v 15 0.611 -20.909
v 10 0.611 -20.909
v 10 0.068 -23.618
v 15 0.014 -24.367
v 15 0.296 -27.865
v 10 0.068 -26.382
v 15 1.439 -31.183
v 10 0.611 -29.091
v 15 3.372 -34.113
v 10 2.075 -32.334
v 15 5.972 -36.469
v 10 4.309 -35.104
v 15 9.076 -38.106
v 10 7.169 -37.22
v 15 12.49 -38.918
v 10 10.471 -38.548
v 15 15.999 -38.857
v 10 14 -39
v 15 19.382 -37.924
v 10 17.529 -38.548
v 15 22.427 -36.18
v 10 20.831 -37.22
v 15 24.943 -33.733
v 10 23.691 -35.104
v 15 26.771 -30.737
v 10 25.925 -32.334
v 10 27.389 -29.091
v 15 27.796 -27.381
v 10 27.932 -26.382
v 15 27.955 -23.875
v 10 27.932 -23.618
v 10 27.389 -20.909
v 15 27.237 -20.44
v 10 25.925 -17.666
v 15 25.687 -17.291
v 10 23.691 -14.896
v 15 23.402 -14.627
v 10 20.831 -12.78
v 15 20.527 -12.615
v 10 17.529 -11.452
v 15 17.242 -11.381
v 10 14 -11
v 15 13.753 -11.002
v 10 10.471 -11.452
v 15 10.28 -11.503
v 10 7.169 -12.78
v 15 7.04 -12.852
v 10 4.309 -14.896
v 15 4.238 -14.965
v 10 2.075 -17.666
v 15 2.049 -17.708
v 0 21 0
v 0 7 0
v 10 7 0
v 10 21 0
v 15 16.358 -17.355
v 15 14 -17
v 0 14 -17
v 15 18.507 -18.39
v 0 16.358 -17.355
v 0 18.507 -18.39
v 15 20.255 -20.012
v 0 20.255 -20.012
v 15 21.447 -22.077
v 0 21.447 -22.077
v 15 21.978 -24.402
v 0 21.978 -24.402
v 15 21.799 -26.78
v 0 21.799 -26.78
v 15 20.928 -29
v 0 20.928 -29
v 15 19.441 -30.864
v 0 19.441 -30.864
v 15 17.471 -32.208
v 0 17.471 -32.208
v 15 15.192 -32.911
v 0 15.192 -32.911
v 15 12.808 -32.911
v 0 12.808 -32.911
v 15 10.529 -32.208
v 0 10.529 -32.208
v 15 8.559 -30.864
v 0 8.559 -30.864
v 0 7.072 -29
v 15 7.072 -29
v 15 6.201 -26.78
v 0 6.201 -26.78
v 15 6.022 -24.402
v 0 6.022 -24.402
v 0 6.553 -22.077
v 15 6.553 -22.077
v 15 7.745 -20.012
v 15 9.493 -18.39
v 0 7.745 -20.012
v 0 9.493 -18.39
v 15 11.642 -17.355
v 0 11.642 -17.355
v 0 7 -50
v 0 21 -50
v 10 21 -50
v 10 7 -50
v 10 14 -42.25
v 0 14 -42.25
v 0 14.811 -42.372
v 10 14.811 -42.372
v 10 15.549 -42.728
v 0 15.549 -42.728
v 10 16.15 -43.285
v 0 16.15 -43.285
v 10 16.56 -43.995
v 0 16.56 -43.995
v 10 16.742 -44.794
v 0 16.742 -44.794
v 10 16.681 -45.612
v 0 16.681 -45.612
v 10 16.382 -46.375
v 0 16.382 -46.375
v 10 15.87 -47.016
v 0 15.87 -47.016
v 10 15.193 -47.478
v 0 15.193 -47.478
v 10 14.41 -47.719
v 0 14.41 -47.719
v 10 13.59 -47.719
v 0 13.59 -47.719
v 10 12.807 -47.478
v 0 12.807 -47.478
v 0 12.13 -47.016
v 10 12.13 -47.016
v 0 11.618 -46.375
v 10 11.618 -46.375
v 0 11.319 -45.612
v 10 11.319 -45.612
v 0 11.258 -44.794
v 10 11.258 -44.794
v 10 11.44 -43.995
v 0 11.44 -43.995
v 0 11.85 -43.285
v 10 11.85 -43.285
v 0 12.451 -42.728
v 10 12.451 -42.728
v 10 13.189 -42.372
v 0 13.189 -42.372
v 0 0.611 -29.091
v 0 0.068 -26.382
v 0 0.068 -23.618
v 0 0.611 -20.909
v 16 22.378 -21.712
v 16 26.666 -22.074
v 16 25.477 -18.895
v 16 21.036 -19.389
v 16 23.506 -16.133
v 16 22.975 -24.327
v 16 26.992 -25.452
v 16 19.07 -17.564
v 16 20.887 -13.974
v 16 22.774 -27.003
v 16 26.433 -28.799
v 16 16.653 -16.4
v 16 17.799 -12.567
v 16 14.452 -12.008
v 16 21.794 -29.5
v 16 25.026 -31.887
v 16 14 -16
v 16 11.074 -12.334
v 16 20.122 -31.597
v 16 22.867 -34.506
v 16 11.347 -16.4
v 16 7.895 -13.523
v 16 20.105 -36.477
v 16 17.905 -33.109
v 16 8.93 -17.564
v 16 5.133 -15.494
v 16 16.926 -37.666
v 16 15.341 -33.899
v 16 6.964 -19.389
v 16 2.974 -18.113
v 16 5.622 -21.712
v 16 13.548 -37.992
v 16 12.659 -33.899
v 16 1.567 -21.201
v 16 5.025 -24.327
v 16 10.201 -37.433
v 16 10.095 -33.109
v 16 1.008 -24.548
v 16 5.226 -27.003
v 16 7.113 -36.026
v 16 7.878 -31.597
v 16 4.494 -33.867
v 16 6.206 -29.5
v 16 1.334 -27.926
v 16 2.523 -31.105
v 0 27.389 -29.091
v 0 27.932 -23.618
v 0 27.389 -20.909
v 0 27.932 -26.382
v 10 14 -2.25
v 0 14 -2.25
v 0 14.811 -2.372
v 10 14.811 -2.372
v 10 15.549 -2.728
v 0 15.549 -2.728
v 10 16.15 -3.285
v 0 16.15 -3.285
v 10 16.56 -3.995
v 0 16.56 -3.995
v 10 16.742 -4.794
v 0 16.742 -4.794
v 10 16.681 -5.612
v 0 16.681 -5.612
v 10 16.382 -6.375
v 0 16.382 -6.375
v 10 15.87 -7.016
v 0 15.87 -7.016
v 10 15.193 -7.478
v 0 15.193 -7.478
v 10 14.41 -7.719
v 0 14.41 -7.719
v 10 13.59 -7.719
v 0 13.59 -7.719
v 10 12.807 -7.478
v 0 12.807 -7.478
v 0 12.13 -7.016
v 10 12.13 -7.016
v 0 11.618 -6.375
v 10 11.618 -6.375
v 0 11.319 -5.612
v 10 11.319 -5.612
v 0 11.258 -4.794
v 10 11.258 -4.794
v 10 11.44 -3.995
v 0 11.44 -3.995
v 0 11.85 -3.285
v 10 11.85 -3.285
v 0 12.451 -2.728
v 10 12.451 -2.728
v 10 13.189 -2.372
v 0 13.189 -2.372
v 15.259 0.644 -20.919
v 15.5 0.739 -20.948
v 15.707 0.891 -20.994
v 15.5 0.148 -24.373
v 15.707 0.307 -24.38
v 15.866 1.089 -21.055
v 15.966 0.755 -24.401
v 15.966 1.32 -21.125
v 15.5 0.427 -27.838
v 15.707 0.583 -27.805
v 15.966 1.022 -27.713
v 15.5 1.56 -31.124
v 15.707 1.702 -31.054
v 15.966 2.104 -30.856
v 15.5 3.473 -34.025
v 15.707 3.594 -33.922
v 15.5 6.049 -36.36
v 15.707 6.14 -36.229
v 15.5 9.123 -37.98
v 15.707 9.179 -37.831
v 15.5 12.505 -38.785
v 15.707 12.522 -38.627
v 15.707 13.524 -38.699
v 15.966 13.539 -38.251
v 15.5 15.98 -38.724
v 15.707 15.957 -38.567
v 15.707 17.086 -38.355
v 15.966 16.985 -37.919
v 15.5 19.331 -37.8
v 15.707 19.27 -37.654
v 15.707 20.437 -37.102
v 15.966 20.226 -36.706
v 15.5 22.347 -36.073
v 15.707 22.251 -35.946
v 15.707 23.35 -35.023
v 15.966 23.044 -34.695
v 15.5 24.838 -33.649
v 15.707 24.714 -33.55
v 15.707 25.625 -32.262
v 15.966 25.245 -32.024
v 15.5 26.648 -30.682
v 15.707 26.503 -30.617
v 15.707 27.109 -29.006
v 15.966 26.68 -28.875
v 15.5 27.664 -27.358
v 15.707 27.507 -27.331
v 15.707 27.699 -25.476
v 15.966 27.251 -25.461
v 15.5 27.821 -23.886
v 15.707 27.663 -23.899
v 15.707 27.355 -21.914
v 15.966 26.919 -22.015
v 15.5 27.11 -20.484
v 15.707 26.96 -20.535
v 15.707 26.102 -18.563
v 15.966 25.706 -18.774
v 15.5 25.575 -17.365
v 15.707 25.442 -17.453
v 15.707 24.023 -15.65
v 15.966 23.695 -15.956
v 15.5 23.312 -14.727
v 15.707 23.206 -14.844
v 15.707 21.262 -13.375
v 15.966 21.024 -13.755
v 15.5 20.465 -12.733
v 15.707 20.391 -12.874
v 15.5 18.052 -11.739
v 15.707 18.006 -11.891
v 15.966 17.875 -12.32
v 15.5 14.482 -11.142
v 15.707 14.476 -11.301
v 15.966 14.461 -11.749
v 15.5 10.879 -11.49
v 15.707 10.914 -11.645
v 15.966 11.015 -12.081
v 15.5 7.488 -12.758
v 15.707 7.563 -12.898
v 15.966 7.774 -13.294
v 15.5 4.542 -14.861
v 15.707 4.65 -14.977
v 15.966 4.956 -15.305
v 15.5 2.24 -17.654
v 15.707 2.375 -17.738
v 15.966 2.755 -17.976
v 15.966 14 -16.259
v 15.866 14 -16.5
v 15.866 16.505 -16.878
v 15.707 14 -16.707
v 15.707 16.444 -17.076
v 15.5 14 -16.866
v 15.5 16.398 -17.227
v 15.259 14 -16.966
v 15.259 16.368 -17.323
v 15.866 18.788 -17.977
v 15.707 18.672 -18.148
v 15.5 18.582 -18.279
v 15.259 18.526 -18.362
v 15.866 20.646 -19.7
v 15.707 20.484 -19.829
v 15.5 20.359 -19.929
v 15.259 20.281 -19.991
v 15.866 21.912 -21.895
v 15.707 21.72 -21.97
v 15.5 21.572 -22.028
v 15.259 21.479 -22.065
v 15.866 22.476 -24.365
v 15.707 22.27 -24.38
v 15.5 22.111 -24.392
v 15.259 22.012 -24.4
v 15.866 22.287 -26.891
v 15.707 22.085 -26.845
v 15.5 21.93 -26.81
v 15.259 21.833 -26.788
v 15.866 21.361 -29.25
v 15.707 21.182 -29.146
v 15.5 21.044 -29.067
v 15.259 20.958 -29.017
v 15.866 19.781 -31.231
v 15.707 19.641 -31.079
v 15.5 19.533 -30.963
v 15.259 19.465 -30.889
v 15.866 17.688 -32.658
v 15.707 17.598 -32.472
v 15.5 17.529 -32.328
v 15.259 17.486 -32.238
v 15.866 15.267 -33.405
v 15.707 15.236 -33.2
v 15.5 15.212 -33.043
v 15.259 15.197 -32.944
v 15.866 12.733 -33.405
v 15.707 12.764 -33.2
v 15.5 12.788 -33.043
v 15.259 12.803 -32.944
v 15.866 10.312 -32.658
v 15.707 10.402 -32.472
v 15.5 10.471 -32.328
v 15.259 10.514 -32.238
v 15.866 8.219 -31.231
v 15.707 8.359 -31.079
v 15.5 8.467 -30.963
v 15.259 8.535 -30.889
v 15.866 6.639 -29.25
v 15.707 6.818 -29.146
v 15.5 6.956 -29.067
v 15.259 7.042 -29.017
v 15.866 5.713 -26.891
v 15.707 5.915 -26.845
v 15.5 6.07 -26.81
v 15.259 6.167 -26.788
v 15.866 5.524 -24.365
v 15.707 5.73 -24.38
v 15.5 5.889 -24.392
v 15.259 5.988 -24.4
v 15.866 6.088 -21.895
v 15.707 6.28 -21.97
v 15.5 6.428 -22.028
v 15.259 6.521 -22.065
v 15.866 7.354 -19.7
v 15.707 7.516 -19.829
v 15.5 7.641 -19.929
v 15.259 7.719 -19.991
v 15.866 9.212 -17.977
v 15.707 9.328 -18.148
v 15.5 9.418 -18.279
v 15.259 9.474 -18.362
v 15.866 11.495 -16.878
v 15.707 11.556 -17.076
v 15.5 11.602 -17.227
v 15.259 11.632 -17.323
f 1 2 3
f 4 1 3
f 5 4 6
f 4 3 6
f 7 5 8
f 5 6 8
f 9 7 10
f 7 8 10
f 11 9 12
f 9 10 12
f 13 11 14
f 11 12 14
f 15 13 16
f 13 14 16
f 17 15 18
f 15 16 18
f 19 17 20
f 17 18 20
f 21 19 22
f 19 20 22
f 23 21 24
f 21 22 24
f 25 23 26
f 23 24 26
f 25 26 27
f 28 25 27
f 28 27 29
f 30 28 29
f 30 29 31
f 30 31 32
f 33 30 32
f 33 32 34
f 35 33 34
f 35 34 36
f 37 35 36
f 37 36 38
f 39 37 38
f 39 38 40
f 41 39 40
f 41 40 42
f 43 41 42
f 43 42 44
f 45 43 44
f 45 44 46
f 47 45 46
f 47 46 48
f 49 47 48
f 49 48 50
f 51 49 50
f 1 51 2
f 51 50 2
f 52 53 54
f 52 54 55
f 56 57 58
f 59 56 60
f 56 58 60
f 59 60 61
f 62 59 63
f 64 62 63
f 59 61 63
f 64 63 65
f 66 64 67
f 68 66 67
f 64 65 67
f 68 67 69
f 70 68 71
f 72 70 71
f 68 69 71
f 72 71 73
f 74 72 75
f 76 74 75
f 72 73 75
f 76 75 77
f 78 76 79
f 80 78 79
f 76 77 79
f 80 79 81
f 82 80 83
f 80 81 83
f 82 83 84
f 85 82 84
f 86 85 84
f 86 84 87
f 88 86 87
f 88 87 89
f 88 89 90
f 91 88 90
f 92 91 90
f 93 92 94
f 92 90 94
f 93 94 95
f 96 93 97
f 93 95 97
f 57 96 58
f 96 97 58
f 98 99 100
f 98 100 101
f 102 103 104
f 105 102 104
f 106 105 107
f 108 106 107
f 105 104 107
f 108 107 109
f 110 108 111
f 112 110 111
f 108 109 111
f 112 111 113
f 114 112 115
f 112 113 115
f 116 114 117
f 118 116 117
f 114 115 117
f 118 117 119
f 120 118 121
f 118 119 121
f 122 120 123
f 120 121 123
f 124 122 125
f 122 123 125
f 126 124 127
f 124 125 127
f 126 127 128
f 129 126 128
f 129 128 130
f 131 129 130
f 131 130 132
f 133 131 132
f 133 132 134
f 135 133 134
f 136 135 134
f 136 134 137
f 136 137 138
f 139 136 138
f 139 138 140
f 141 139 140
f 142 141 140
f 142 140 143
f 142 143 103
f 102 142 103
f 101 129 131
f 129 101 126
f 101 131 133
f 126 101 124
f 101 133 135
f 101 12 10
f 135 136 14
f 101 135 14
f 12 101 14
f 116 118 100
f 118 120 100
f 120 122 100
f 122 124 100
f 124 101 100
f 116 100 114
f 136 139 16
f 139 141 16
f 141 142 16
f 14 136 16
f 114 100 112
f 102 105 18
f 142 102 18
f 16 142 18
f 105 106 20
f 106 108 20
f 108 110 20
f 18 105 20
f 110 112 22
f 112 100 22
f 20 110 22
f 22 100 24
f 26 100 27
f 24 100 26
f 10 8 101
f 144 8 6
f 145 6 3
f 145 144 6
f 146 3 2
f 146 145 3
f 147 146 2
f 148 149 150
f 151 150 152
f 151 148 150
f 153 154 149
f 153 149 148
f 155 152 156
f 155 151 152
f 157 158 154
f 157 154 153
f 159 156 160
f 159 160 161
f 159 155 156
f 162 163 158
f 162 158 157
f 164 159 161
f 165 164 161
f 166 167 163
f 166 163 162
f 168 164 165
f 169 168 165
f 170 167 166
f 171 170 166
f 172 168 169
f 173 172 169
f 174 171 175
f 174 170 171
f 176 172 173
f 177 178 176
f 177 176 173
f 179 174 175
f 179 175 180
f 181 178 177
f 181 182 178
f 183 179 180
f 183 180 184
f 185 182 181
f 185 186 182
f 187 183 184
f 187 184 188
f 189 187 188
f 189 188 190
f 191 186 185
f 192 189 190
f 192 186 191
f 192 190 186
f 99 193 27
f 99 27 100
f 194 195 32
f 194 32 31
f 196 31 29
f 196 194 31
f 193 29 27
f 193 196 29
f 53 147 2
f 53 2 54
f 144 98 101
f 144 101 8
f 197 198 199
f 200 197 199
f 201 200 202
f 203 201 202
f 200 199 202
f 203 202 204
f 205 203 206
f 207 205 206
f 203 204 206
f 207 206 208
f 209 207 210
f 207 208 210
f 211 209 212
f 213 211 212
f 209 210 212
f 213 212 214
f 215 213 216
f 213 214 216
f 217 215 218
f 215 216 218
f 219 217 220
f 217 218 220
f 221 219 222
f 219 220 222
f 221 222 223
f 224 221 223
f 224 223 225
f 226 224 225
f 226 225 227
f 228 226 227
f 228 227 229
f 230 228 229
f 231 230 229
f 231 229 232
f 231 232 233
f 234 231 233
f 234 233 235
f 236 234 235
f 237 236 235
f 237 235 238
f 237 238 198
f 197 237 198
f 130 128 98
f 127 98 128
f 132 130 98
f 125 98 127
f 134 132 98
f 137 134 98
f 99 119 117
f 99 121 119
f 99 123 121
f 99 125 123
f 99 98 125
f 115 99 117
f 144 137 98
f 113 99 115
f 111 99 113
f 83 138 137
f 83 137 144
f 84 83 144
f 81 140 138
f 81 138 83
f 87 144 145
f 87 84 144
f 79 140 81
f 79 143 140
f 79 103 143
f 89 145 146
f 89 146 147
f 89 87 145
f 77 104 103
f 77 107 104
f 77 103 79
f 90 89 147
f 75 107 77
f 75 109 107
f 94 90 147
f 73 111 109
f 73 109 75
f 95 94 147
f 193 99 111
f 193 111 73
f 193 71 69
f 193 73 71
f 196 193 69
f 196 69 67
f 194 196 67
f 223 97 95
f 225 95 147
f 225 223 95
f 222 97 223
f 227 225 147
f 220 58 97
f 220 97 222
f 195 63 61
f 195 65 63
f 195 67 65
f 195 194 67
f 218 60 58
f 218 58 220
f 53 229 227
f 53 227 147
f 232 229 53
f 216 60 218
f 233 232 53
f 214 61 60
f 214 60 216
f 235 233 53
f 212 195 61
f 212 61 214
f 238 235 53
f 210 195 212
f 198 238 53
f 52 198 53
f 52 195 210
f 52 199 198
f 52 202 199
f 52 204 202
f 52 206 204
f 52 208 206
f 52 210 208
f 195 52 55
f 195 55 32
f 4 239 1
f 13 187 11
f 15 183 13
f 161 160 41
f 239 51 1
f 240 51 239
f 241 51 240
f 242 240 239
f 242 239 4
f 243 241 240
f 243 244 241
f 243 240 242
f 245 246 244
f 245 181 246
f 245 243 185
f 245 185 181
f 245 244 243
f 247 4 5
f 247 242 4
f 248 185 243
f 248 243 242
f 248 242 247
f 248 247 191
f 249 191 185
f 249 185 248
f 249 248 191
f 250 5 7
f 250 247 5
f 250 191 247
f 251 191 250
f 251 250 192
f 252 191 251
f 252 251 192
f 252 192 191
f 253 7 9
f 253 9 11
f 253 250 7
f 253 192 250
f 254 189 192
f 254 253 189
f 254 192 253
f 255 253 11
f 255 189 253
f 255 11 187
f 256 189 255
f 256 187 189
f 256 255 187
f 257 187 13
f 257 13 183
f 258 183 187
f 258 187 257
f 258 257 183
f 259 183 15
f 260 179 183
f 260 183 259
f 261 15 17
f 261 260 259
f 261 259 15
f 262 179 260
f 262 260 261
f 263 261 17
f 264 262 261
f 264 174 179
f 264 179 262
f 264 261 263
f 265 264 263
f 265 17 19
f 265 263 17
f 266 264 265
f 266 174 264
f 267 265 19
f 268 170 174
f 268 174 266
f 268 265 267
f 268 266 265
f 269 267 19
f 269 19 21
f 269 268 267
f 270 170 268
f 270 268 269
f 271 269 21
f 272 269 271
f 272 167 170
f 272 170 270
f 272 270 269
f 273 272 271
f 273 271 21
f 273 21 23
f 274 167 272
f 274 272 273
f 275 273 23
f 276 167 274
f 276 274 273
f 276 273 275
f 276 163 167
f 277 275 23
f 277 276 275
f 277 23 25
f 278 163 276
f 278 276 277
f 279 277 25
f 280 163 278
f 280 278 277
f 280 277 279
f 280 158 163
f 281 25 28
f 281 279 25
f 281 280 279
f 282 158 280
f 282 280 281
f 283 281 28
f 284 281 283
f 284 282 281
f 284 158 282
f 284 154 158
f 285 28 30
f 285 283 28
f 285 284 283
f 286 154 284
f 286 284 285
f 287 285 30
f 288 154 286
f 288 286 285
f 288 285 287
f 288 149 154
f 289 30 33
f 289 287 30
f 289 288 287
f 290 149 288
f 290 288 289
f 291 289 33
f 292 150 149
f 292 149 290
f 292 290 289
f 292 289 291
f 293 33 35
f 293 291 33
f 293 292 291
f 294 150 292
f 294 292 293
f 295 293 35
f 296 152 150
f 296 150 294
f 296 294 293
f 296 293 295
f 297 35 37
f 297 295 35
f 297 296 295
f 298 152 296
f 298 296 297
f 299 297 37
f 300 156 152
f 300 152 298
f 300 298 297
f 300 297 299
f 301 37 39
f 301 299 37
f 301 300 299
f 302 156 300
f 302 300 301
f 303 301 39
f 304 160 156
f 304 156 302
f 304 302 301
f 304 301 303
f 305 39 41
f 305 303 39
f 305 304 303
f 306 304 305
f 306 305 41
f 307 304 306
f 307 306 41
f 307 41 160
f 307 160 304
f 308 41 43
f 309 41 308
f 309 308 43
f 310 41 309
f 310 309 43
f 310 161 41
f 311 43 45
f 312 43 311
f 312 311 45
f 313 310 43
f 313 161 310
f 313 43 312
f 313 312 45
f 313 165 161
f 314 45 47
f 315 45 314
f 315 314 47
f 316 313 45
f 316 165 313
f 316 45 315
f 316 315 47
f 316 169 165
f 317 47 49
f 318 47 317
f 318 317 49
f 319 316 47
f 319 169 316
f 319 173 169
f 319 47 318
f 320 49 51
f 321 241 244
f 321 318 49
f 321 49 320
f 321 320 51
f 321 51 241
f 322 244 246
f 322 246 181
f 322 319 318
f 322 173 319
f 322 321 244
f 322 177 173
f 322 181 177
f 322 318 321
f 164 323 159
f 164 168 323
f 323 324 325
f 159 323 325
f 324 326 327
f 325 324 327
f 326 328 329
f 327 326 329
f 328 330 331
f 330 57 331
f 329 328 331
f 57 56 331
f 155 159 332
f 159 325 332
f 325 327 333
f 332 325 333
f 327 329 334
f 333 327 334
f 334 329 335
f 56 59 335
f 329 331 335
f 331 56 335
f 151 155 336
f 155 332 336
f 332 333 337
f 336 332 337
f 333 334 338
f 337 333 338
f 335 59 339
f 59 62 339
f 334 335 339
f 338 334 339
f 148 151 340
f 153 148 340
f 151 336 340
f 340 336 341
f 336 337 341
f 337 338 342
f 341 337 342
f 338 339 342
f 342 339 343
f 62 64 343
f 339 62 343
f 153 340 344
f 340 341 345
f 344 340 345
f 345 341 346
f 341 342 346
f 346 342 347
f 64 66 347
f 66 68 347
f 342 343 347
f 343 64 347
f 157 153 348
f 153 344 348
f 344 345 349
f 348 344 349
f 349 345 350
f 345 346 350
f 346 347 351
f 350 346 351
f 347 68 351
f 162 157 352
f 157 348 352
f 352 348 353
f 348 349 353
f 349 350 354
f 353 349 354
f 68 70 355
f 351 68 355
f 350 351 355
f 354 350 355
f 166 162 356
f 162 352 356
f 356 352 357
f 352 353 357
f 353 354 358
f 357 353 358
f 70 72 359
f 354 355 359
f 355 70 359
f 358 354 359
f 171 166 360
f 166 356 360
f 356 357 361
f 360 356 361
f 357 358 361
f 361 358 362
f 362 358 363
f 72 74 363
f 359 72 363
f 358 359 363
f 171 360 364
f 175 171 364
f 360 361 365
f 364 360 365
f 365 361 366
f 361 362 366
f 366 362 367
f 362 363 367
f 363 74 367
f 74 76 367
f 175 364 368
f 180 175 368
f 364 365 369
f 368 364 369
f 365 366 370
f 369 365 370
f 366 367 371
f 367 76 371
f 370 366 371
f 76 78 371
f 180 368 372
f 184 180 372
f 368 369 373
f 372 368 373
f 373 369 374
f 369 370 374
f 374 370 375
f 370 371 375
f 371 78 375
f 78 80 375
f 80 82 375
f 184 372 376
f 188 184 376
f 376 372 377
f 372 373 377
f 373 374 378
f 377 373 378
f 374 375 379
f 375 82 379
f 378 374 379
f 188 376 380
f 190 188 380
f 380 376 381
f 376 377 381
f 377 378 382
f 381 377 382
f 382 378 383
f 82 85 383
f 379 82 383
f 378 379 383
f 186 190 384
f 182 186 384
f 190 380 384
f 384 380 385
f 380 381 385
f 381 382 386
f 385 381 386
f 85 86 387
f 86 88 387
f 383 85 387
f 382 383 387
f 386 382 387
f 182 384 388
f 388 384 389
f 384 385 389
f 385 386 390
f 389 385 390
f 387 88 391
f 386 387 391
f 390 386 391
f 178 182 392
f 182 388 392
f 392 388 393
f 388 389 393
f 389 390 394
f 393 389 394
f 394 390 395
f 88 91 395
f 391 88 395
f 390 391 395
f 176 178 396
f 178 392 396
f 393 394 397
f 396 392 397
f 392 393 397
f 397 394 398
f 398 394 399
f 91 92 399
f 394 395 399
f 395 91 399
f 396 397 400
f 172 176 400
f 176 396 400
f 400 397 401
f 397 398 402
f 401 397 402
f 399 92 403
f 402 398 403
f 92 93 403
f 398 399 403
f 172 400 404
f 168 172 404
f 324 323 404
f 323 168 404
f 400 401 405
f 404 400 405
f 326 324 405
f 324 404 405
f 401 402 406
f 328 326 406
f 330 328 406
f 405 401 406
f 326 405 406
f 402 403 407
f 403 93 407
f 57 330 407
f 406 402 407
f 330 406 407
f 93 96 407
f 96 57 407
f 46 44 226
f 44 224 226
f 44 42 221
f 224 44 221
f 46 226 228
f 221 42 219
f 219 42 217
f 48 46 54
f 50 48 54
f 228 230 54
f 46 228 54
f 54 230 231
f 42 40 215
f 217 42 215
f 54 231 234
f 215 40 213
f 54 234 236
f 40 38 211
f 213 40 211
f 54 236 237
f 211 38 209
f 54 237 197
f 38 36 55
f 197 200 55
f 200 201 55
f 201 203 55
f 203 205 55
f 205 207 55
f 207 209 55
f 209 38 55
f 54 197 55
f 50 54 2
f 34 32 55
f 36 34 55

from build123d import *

# Parameters (mm, degrees)
BOSS_EXTRUDE1_DEPTH = 10
SKETCH3_R           = 14
BOSS_EXTRUDE2_DEPTH = 6
SKETCH4_R           = 2.75
SKETCH4_R_2         = 8
CUT_EXTRUDE1_DEPTH  = 16
FILLET1_R           = 1


with BuildPart() as part:
    # Sketch2 → Boss-Extrude1 (new body)
    with BuildSketch(Plane(origin=(0, 0, 0), x_dir=(0, 0, -1), z_dir=(1, 0, 0))):
        with BuildLine():
            Line((50, 7), (29.091106, 0.611092))
            ThreePointArc((29.091106, 0.611092), (25, 0), (20.908894, 0.611092))
            Line((20.908894, 0.611092), (0, 7))
            Line((0, 7), (0, 21))
            Line((0, 21), (20.908894, 27.388908))
            ThreePointArc((20.908894, 27.388908), (25, 28), (29.091106, 27.388908))
            Line((29.091106, 27.388908), (50, 21))
            Line((50, 21), (50, 7))
        make_face()
    extrude(amount=BOSS_EXTRUDE1_DEPTH)

    # Sketch3 → Boss-Extrude2 (add)
    with BuildSketch(Plane(origin=(10, 0, 0), x_dir=(0, 0, -1), z_dir=(1, 0, 0))):
        with Locations(Location((25, 14, 0), (0, 0, 253.008979))):
            Circle(SKETCH3_R)
    extrude(amount=BOSS_EXTRUDE2_DEPTH)

    # Sketch4 → Cut-Extrude1 (cut)
    with BuildSketch(Plane.ZY):
        with Locations((-45, 14)):
            Circle(SKETCH4_R)
        with Locations((-25, 14)):
            Circle(SKETCH4_R_2)
        with Locations((-5, 14)):
            Circle(SKETCH4_R)
    extrude(amount=-CUT_EXTRUDE1_DEPTH, mode=Mode.SUBTRACT)

    # Fillet1
    fillet1_edges = [part.edges().sort_by_distance(p)[0] for p in [
        (16, 27.388908, -29.091106),
        (16, 14, -33),
    ]]
    fillet(fillet1_edges, radius=FILLET1_R)


solid = part.part
